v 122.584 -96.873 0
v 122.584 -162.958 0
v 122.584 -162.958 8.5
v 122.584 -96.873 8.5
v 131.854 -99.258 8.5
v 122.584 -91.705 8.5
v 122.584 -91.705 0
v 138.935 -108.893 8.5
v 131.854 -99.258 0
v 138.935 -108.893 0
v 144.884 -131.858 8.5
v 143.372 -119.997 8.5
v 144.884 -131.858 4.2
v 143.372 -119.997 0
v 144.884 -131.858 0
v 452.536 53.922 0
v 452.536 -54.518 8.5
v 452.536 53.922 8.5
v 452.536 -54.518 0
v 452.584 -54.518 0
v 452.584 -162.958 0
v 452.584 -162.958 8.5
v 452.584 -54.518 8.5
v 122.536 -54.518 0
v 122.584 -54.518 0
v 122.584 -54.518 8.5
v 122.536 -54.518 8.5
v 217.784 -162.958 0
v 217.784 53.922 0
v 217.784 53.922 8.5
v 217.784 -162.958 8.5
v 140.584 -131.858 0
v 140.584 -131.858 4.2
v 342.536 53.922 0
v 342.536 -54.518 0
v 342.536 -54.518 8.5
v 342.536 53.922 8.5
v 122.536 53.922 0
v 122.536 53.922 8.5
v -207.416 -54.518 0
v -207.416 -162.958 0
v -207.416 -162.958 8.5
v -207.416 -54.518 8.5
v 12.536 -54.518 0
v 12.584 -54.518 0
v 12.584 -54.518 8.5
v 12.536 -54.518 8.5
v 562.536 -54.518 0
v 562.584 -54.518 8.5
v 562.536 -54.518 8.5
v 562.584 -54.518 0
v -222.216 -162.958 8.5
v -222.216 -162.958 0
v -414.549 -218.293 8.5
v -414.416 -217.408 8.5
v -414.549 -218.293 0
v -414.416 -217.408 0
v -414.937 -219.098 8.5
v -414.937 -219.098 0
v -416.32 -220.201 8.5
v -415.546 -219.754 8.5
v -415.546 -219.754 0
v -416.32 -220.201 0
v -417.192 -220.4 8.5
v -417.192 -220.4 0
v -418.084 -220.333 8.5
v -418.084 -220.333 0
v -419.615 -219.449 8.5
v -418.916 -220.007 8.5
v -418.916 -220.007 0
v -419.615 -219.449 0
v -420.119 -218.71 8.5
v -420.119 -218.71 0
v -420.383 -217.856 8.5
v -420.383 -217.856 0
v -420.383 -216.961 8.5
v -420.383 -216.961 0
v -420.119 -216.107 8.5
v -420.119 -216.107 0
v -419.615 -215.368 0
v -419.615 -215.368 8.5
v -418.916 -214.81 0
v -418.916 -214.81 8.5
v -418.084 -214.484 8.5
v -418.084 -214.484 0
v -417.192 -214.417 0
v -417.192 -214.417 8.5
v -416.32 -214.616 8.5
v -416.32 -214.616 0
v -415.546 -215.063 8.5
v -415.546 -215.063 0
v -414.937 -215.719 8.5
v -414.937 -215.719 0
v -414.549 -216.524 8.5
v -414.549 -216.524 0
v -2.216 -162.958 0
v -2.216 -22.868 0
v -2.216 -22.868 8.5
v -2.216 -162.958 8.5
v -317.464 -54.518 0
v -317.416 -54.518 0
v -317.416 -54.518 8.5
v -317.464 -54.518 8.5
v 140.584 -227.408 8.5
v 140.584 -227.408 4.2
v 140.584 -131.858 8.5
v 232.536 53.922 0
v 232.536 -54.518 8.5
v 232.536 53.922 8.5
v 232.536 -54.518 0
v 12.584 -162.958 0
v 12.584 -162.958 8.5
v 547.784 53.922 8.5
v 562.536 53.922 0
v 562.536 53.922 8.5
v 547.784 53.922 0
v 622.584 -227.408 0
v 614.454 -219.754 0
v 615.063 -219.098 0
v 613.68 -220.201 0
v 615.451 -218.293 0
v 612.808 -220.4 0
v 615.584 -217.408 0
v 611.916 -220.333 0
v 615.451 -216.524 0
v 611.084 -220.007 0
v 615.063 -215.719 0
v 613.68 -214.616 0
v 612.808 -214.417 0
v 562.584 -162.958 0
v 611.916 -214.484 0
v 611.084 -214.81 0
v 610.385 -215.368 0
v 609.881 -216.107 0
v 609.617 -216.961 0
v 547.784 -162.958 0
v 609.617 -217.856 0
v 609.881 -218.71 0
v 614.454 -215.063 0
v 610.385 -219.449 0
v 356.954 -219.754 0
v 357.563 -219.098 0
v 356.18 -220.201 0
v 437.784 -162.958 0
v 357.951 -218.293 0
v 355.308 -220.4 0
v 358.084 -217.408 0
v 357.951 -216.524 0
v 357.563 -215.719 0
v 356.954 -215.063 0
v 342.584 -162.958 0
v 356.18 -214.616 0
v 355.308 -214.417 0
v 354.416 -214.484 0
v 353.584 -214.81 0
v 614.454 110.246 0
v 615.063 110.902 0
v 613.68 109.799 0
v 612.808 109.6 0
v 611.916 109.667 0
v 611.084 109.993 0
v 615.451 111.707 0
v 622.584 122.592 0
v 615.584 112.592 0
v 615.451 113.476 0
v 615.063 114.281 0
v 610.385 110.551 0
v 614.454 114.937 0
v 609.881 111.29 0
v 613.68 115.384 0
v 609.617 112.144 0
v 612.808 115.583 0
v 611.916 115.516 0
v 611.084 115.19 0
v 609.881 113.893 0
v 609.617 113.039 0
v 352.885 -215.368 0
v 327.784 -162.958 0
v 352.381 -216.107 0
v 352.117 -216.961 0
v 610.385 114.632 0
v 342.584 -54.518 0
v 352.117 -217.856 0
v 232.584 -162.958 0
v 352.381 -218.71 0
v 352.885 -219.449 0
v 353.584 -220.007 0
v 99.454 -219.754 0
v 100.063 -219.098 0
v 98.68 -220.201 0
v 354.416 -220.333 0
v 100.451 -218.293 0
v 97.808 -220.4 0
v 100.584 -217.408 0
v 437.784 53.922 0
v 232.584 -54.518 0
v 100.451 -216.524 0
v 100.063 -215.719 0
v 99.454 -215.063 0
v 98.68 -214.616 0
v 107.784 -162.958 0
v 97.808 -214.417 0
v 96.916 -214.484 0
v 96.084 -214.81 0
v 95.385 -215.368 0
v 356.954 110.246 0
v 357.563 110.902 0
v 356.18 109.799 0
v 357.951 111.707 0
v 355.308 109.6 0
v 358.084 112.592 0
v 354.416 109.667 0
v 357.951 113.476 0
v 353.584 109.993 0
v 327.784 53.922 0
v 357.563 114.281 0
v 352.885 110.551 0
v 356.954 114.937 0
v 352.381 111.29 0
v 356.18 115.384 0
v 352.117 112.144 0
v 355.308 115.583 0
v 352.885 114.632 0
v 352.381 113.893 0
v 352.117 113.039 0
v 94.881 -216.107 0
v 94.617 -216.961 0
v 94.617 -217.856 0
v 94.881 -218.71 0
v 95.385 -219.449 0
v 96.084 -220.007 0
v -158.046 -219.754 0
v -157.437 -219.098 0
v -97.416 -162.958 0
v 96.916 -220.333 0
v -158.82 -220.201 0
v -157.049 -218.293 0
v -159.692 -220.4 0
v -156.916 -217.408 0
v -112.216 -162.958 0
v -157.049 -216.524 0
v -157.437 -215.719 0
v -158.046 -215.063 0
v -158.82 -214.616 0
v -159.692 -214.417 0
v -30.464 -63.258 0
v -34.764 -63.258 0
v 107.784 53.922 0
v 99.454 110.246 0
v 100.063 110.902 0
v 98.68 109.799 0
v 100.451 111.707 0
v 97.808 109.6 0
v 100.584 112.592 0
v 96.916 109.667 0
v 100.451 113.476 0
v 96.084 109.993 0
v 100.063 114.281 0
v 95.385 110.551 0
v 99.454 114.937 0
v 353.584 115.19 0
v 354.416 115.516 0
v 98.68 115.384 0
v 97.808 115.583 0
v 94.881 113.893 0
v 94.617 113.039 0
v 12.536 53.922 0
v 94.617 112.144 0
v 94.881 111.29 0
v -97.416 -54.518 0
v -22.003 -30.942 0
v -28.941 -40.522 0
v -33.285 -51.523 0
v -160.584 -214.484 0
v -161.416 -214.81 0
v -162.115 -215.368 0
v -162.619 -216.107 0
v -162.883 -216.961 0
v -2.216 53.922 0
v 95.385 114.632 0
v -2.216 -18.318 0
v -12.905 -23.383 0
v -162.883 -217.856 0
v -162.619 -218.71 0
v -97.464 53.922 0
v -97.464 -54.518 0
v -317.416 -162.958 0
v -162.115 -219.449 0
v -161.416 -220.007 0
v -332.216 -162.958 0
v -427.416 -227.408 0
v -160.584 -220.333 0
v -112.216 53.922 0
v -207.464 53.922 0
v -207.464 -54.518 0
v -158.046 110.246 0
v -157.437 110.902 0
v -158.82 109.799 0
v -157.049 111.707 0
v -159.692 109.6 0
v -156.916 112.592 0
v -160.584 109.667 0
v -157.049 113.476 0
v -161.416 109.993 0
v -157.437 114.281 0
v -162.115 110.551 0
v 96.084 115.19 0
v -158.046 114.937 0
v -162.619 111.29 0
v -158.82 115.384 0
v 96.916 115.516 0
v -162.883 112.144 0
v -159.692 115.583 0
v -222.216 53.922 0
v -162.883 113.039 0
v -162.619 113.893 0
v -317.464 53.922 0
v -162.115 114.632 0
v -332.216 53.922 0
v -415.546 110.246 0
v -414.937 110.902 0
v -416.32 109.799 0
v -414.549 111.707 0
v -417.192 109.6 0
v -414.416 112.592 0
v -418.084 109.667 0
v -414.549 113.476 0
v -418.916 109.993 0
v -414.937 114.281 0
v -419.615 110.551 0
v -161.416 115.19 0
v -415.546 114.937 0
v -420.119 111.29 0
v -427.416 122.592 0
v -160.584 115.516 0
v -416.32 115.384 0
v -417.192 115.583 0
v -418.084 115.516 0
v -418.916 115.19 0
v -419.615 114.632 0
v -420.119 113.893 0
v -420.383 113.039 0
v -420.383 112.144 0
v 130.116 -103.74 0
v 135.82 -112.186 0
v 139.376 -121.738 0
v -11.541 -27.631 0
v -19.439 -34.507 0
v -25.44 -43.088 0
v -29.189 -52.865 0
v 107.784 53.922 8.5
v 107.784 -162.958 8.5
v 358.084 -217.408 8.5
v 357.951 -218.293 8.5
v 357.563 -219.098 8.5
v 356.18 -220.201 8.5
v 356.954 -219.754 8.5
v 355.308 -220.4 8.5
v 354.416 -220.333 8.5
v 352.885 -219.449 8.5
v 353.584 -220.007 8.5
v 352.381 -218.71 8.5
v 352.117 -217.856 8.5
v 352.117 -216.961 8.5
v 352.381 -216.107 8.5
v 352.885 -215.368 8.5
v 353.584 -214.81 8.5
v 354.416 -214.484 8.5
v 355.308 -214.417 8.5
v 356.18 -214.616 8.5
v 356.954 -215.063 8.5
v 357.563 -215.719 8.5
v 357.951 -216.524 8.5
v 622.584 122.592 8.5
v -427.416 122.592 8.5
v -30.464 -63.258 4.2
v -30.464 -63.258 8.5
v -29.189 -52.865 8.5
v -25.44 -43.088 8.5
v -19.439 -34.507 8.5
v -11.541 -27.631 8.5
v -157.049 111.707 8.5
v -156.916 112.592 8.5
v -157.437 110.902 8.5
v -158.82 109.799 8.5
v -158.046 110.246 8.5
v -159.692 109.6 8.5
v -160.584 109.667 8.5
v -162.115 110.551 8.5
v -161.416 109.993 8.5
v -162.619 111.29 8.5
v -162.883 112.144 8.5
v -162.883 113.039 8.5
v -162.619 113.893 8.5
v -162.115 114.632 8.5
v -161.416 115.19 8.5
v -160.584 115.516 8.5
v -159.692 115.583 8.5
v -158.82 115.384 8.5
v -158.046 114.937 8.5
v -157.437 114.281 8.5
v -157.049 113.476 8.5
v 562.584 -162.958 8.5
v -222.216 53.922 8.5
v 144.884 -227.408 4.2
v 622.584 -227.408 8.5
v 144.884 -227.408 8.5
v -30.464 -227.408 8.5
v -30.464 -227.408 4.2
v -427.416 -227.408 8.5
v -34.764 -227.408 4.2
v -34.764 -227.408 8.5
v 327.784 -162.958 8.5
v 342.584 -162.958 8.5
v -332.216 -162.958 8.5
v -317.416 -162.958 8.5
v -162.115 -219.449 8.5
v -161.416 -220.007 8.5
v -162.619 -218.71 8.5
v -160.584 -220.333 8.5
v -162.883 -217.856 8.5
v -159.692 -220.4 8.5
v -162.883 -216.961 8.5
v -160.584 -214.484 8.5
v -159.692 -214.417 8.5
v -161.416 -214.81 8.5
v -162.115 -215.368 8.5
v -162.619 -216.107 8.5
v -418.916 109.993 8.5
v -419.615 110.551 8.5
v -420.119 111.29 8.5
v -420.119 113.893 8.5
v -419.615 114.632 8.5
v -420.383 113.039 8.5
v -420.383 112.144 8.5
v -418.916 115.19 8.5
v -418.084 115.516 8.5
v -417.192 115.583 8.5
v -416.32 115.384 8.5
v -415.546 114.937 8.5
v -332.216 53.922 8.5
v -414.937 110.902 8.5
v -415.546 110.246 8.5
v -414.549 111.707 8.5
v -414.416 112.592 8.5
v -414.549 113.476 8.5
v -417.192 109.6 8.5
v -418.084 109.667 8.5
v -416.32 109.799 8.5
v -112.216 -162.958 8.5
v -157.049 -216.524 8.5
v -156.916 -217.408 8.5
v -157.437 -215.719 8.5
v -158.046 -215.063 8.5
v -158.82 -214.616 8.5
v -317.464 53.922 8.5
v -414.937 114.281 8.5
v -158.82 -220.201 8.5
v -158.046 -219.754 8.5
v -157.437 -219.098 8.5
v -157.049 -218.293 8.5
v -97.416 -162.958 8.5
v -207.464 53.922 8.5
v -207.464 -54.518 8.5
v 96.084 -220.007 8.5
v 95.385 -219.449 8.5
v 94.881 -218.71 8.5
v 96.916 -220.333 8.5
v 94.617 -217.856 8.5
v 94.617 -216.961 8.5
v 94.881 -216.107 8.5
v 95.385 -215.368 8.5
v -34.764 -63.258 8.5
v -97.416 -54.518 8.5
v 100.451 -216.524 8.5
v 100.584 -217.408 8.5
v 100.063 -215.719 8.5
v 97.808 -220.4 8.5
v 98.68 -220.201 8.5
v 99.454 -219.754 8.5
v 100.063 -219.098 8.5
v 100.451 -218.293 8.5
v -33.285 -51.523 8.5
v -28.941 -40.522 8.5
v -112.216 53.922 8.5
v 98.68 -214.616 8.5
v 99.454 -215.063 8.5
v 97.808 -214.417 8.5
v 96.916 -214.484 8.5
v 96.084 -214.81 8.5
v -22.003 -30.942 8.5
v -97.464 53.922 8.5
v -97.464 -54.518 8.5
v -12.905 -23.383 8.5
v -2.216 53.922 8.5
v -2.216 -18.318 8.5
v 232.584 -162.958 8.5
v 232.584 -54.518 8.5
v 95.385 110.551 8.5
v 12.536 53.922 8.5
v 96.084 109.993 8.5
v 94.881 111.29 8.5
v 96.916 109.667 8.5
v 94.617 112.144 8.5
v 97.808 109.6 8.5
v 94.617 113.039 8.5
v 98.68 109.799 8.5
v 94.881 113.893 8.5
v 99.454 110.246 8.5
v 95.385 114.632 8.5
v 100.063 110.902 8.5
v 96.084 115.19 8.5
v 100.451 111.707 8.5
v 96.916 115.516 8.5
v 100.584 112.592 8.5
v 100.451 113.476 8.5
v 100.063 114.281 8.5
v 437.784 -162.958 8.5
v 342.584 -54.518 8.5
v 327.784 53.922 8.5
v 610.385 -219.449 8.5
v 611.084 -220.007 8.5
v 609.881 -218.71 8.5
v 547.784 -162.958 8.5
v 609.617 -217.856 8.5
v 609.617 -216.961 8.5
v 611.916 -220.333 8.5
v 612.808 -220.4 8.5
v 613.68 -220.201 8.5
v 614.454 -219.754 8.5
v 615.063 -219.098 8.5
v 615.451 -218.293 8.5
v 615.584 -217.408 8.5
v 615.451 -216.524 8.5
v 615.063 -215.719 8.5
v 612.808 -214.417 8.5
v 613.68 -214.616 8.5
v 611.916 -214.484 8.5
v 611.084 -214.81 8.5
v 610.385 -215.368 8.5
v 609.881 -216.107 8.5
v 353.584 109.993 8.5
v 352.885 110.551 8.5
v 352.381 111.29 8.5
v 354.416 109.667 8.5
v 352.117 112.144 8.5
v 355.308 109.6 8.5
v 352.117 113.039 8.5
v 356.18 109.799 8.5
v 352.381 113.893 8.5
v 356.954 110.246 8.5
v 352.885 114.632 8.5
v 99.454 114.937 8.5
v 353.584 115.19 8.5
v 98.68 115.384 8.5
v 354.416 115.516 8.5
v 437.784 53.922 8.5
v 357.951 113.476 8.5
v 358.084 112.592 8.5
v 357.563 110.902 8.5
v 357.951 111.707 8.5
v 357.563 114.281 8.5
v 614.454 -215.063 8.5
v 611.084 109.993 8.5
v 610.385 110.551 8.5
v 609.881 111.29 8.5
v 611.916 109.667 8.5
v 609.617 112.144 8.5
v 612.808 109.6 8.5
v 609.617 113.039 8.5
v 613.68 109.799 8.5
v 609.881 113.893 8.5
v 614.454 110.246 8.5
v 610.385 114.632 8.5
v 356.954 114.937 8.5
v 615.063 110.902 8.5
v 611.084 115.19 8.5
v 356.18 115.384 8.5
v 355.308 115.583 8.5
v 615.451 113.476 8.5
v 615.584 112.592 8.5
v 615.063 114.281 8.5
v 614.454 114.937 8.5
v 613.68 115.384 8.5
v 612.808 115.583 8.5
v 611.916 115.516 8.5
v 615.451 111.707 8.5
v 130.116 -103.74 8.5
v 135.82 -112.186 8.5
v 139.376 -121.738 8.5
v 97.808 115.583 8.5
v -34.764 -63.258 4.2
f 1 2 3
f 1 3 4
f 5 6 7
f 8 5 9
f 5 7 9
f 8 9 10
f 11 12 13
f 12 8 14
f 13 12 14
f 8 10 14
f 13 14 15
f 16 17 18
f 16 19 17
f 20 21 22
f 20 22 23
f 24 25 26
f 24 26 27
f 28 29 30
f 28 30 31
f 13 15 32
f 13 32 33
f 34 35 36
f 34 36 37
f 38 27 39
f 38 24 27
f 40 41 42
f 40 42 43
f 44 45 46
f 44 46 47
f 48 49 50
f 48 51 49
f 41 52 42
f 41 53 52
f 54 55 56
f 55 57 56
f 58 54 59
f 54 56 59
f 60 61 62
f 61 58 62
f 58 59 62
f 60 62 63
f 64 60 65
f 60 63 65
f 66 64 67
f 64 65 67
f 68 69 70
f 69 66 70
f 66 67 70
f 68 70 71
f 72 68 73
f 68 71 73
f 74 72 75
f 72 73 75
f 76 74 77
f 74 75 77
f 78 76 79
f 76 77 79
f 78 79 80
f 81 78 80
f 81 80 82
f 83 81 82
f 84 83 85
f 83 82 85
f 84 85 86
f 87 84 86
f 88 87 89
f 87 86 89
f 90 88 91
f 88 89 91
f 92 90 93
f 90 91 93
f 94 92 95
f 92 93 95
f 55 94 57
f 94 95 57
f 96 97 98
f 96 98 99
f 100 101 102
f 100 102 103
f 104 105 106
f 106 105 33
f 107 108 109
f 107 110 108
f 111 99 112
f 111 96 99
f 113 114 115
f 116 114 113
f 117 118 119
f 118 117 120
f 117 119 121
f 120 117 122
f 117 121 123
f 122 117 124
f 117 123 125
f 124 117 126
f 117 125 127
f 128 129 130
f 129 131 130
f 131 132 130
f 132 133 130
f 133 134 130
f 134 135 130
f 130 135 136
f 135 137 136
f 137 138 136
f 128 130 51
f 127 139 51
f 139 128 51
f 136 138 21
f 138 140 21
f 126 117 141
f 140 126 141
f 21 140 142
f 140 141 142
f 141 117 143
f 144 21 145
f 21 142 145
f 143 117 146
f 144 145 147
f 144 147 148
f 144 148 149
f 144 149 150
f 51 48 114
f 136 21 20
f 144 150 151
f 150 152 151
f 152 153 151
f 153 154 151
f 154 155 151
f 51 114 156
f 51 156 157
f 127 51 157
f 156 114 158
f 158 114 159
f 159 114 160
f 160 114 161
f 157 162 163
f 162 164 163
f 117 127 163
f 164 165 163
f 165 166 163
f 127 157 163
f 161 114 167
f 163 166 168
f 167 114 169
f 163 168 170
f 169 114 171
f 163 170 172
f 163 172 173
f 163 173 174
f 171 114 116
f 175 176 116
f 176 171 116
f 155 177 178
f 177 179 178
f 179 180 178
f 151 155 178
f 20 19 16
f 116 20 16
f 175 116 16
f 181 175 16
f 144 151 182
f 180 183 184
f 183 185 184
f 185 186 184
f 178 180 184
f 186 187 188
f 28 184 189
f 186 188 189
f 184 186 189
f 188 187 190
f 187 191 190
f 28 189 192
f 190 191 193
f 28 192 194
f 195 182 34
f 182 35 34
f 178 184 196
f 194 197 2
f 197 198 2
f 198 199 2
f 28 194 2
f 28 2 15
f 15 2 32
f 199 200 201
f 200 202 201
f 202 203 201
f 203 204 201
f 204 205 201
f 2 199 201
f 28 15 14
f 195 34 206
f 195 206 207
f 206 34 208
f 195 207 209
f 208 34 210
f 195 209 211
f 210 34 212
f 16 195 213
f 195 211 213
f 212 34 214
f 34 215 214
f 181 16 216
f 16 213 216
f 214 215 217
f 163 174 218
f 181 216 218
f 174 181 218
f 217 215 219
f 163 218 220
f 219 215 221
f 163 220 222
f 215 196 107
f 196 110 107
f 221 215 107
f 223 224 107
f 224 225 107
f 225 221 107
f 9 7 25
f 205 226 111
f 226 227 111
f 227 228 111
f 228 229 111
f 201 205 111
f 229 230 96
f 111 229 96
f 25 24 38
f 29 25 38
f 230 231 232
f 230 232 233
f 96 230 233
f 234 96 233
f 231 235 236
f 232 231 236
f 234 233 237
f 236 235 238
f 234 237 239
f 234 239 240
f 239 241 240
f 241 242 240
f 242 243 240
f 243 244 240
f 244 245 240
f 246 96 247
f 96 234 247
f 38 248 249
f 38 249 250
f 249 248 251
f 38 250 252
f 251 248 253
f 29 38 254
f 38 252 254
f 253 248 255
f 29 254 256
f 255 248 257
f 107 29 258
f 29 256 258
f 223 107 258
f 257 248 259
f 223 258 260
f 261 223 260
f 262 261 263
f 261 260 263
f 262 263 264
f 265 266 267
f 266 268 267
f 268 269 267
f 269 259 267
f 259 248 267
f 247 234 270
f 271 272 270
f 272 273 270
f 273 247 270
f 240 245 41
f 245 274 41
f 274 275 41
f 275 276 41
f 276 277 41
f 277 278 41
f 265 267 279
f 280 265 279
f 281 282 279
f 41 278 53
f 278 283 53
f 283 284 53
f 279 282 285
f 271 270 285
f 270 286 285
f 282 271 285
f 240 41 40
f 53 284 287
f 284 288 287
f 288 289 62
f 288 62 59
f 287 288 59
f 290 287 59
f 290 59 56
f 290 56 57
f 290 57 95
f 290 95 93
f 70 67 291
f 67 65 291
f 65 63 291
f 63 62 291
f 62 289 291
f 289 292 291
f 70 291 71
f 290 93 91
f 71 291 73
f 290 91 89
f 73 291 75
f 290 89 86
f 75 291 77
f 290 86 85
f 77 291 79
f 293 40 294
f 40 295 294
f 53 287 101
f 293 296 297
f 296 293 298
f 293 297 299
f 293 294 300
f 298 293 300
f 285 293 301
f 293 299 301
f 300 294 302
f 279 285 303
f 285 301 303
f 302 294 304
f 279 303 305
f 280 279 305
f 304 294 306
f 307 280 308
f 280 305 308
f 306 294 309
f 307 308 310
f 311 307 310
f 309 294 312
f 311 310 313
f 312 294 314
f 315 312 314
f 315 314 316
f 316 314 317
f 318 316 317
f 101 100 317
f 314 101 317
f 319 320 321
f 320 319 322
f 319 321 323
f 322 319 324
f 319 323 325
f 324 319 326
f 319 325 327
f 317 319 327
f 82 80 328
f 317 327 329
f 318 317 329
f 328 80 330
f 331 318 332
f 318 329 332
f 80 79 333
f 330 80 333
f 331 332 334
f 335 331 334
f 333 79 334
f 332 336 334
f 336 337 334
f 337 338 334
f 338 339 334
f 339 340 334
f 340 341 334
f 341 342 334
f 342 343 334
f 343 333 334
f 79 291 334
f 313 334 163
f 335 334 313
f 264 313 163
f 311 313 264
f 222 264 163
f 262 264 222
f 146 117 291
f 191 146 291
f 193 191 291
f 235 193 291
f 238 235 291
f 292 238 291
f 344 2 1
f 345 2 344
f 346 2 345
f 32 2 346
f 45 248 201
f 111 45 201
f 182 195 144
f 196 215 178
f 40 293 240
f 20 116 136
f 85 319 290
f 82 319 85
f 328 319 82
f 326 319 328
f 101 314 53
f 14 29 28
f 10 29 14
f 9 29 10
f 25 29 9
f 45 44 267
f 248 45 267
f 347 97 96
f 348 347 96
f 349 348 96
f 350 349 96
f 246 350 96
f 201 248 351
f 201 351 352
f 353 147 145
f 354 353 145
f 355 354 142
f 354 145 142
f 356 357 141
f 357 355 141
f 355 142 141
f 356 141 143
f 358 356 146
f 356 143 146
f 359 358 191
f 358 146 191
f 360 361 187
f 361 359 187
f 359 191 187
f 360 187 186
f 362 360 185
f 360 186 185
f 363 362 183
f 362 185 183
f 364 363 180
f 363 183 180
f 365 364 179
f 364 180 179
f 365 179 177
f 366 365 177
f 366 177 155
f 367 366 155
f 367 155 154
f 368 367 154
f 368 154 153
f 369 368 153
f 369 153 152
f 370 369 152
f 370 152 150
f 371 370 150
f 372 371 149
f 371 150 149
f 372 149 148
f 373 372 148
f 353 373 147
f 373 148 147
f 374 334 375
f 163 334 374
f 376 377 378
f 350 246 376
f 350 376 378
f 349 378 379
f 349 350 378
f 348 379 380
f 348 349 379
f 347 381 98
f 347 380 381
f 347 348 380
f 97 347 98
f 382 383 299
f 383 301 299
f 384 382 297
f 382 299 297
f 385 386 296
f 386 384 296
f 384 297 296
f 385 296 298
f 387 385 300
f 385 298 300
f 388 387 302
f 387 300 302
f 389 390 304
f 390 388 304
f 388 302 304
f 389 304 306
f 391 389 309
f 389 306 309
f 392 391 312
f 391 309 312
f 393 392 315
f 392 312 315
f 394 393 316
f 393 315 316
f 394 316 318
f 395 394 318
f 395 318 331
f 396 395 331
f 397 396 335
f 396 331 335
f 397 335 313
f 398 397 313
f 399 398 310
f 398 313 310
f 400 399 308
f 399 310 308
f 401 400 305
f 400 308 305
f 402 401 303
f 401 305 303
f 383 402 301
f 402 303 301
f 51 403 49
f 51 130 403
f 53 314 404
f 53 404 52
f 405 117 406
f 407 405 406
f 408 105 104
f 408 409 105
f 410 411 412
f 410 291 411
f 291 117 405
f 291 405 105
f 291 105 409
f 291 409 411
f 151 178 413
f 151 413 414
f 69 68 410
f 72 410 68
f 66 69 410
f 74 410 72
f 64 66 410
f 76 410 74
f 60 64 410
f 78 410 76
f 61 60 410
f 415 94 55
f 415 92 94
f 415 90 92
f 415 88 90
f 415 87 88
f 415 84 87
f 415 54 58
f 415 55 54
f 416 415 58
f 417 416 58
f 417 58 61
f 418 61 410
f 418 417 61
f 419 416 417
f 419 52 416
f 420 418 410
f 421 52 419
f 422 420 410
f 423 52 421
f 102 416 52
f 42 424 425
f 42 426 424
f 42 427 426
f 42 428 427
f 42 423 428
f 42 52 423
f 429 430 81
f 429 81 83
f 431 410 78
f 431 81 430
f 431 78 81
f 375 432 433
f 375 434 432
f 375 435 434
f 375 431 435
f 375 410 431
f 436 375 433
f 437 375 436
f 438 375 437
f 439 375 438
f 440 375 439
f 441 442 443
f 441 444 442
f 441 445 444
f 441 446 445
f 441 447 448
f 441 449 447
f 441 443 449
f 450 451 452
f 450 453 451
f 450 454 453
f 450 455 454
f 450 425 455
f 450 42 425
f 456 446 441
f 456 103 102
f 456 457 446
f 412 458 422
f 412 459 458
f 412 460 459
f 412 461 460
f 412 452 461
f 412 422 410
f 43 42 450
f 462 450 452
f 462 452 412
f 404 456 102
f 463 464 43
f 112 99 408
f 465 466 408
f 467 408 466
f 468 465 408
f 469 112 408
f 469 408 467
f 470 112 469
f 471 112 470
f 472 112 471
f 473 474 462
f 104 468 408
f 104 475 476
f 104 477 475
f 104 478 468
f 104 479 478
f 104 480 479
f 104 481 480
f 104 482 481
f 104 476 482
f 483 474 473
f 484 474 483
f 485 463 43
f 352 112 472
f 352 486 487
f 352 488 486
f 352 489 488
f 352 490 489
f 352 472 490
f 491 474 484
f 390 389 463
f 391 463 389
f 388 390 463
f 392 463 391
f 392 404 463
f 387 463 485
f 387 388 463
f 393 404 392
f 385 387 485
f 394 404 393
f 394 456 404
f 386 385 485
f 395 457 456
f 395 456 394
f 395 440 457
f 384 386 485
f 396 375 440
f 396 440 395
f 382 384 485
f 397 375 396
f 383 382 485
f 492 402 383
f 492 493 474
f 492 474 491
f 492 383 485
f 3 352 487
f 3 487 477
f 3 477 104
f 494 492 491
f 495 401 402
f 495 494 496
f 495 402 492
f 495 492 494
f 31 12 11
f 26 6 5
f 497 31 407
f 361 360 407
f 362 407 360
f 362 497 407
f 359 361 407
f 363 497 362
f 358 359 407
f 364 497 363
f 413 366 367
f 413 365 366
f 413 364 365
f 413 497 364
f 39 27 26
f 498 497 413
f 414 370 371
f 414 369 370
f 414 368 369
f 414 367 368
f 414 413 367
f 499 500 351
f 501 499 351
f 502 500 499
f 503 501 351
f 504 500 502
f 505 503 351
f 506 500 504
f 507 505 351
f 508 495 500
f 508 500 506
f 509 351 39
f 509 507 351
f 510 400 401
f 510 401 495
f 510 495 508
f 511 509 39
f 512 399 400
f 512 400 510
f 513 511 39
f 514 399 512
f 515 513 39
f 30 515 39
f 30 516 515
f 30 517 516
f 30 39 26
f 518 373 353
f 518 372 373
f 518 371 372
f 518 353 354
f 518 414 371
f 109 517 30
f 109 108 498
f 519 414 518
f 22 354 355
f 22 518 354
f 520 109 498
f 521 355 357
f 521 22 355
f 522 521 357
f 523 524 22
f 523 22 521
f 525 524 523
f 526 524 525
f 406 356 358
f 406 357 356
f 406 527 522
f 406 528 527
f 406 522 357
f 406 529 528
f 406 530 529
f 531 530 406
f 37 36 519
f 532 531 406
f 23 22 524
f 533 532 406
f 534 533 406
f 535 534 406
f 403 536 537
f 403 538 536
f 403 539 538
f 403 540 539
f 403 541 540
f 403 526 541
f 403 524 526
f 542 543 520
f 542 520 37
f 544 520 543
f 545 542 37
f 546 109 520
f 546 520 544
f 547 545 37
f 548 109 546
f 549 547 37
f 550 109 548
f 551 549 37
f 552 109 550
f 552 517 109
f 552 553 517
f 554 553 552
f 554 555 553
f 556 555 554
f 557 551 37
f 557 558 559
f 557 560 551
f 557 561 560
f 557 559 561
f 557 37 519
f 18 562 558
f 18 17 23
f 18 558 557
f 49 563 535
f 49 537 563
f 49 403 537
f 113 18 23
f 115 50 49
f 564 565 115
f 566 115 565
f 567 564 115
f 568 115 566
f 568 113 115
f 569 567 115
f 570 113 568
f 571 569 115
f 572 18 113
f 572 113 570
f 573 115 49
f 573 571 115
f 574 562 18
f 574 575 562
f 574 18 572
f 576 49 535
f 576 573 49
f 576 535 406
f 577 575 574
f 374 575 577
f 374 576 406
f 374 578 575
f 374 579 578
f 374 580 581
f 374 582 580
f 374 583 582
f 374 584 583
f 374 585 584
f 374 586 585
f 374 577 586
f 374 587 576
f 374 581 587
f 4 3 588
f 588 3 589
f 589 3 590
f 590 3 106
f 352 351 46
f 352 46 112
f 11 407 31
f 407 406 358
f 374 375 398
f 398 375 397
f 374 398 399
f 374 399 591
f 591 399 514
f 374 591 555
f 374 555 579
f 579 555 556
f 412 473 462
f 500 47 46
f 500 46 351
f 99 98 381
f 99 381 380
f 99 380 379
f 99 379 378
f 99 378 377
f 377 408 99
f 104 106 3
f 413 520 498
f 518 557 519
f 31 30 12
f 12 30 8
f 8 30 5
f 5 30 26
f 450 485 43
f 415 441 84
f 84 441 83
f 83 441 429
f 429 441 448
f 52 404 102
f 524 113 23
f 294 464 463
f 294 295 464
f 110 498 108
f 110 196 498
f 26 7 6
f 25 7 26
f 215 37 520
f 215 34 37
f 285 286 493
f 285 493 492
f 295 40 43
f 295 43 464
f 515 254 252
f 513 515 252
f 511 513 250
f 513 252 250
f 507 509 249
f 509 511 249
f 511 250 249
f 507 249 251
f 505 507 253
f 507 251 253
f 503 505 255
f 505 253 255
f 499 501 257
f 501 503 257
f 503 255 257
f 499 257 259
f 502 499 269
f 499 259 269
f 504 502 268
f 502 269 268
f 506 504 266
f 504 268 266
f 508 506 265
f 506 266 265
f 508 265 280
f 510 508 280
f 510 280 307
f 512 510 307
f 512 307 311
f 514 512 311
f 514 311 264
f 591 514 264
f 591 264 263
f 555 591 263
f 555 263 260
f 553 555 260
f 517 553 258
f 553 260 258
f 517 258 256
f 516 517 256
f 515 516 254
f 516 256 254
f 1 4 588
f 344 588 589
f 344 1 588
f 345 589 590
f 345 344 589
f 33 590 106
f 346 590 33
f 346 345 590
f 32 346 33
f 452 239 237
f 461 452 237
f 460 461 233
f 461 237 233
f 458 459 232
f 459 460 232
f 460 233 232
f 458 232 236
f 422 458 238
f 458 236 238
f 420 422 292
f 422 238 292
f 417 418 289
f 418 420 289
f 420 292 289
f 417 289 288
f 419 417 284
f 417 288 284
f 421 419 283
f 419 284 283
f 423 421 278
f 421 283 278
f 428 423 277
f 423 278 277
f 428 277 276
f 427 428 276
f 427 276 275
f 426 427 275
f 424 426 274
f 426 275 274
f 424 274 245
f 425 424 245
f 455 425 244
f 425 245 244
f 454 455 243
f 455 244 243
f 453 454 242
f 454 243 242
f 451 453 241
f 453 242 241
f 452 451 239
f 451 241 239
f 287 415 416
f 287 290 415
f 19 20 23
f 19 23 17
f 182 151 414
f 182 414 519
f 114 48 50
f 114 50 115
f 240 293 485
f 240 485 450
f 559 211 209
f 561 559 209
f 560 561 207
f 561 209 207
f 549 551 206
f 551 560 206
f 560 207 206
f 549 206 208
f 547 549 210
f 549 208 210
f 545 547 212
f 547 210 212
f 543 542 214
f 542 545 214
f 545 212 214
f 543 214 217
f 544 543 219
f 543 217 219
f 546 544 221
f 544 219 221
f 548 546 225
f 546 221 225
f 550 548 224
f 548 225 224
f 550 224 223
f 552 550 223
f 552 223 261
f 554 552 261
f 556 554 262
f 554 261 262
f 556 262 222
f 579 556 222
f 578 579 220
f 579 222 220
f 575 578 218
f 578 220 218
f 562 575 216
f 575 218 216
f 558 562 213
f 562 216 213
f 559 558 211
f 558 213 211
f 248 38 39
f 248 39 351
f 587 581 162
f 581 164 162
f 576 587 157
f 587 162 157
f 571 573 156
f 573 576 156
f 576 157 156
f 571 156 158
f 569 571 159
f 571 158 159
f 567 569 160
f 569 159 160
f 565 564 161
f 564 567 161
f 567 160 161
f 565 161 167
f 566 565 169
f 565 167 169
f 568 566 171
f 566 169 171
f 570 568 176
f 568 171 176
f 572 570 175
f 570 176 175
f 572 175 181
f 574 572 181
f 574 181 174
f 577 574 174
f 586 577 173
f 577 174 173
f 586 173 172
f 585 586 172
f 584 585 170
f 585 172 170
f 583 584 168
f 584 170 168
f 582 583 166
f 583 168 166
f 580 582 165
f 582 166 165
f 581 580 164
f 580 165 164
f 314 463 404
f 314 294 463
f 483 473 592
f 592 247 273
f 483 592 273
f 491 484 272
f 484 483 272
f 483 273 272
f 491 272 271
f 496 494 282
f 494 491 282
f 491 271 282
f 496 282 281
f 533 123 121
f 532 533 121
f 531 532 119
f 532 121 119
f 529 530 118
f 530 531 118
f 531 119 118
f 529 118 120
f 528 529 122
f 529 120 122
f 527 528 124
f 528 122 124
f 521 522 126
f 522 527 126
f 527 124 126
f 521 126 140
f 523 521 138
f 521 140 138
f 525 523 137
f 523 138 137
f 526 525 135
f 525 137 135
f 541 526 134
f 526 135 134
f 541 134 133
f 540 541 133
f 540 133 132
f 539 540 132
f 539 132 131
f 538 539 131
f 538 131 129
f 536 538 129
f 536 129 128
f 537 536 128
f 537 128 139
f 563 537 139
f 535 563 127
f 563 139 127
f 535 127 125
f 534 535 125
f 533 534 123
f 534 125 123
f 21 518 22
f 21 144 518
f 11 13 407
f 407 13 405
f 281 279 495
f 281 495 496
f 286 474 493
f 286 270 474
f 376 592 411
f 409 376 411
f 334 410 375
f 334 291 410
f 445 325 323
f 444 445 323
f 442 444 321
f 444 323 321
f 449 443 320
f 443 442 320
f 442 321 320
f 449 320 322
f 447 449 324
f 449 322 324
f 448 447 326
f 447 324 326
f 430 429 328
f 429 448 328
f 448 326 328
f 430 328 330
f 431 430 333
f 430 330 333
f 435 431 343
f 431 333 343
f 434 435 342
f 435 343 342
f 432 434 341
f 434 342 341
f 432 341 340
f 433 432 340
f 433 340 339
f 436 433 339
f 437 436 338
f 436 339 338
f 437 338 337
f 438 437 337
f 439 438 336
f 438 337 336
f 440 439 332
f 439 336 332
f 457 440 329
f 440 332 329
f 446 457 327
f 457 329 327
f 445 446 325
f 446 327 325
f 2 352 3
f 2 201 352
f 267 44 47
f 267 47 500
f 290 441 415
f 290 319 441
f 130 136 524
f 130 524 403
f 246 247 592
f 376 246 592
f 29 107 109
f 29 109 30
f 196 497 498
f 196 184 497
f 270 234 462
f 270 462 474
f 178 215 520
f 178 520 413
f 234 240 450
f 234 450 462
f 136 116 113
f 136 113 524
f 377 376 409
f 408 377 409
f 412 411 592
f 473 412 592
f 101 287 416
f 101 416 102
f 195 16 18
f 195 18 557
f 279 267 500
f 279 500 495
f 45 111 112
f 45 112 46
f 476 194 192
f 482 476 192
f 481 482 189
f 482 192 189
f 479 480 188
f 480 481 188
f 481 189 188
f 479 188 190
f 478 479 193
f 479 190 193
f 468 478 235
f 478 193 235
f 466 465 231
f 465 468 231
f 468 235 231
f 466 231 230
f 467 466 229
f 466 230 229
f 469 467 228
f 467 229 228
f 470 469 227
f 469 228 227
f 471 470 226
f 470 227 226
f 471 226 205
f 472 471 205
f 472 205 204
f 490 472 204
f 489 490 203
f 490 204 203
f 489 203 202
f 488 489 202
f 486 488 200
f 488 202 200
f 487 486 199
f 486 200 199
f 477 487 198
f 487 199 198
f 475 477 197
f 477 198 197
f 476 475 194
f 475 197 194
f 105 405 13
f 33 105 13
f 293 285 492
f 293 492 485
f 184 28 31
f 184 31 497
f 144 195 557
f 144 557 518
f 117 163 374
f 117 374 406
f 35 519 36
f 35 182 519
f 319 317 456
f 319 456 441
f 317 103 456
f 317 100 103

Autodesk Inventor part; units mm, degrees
ref_plane "YZ Plane" through (0, 0, 0) normal (1, 0, 0) x (0, 1, 0)
ref_plane "XZ Plane" through (0, 0, 0) normal (0, 1, 0) x (-1, 0, 0)
ref_plane "XY Plane" through (0, 0, 0) normal (0, 0, 1) x (1, 0, 0)
sketch "Sketch1" plane through (0, 0, 0) normal (0, 0, 1) x (1, 0, 0)
  line L0 (97.5839, -20.2585) -> (97.5839, -84.5585) construction
  line L1 (97.5839, -52.4085) -> (19.6066, -52.4085)
  line L2 (622.5839, -227.4085) -> (-427.4161, -227.4085)
  line L3 (-427.4161, -227.4085) -> (-427.4161, 122.5915)
  line L4 (-427.4161, 122.5915) -> (622.5839, 122.5915)
  line L5 (622.5839, 122.5915) -> (622.5839, -227.4085)
  line L6 (622.5839, -227.4085) -> (-427.4161, 122.5915) construction
  line L7 (-427.4161, -227.4085) -> (622.5839, 122.5915) construction
  line L8 (122.536, -54.5185) -> (122.536, 53.9215) projected
  line L9 (122.536, 53.9215) -> (107.7839, 53.9215) projected
  line L10 (107.7839, 53.9215) -> (107.7839, -54.5185) projected
  line L11 (107.7839, -54.5185) -> (122.536, -54.5185) projected
  line L12 (122.5839, -162.9585) -> (122.5839, -54.5185) projected
  line L13 (122.5839, -54.5185) -> (107.7839, -54.5185) projected
  line L14 (107.7839, -54.5185) -> (107.7839, -162.9585) projected
  line L15 (107.7839, -162.9585) -> (122.5839, -162.9585) projected
  line L16 (12.536, -54.5185) -> (12.536, 53.9215) projected
  line L17 (12.536, 53.9215) -> (-2.2161, 53.9215) projected
  line L18 (-2.2161, 53.9215) -> (-2.2161, -54.5185) projected
  line L19 (-2.2161, -54.5185) -> (12.536, -54.5185) projected
  line L20 (12.5839, -162.9585) -> (12.5839, -54.5185) projected
  line L21 (12.5839, -54.5185) -> (-2.2161, -54.5185) projected
  line L22 (-2.2161, -54.5185) -> (-2.2161, -162.9585) projected
  line L23 (-2.2161, -162.9585) -> (12.5839, -162.9585) projected
  line L24 (-97.4161, -162.9585) -> (-97.4161, -54.5185) projected
  line L25 (-97.4161, -54.5185) -> (-112.2161, -54.5185) projected
  line L26 (-112.2161, -54.5185) -> (-112.2161, -162.9585) projected
  line L27 (-112.2161, -162.9585) -> (-97.4161, -162.9585) projected
  line L28 (-97.464, -54.5185) -> (-97.464, 53.9215) projected
  line L29 (-97.464, 53.9215) -> (-112.2161, 53.9215) projected
  line L30 (-112.2161, 53.9215) -> (-112.2161, -54.5185) projected
  line L31 (-112.2161, -54.5185) -> (-97.464, -54.5185) projected
  line L32 (-317.464, -54.5185) -> (-317.464, 53.9215) projected
  line L33 (-317.464, 53.9215) -> (-332.2161, 53.9215) projected
  line L34 (-332.2161, 53.9215) -> (-332.2161, -54.5185) projected
  line L35 (-332.2161, -54.5185) -> (-317.464, -54.5185) projected
  line L36 (-317.4161, -162.9585) -> (-317.4161, -54.5185) projected
  line L37 (-317.4161, -54.5185) -> (-332.2161, -54.5185) projected
  line L38 (-332.2161, -54.5185) -> (-332.2161, -162.9585) projected
  line L39 (-332.2161, -162.9585) -> (-317.4161, -162.9585) projected
  line L40 (-207.4161, -162.9585) -> (-207.4161, -54.5185) projected
  line L41 (-207.4161, -54.5185) -> (-222.2161, -54.5185) projected
  line L42 (-222.2161, -54.5185) -> (-222.2161, -162.9585) projected
  line L43 (-222.2161, -162.9585) -> (-207.4161, -162.9585) projected
  line L44 (-207.464, -54.5185) -> (-207.464, 53.9215) projected
  line L45 (-207.464, 53.9215) -> (-222.2161, 53.9215) projected
  line L46 (-222.2161, 53.9215) -> (-222.2161, -54.5185) projected
  line L47 (-222.2161, -54.5185) -> (-207.464, -54.5185) projected
  line L48 (562.536, -54.5185) -> (562.536, 53.9215) projected
  line L49 (562.536, 53.9215) -> (547.7839, 53.9215) projected
  line L50 (547.7839, 53.9215) -> (547.7839, -54.5185) projected
  line L51 (547.7839, -54.5185) -> (562.536, -54.5185) projected
  line L52 (562.5839, -162.9585) -> (562.5839, -54.5185) projected
  line L53 (562.5839, -54.5185) -> (547.7839, -54.5185) projected
  line L54 (547.7839, -54.5185) -> (547.7839, -162.9585) projected
  line L55 (547.7839, -162.9585) -> (562.5839, -162.9585) projected
  line L56 (452.5839, -162.9585) -> (452.5839, -54.5185) projected
  line L57 (452.5839, -54.5185) -> (437.7839, -54.5185) projected
  line L58 (437.7839, -54.5185) -> (437.7839, -162.9585) projected
  line L59 (437.7839, -162.9585) -> (452.5839, -162.9585) projected
  line L60 (452.536, -54.5185) -> (452.536, 53.9215) projected
  line L61 (452.536, 53.9215) -> (437.7839, 53.9215) projected
  line L62 (437.7839, 53.9215) -> (437.7839, -54.5185) projected
  line L63 (437.7839, -54.5185) -> (452.536, -54.5185) projected
  line L64 (342.536, -54.5185) -> (342.536, 53.9215) projected
  line L65 (342.536, 53.9215) -> (327.7839, 53.9215) projected
  line L66 (327.7839, 53.9215) -> (327.7839, -54.5185) projected
  line L67 (327.7839, -54.5185) -> (342.536, -54.5185) projected
  line L68 (342.5839, -162.9585) -> (342.5839, -54.5185) projected
  line L69 (342.5839, -54.5185) -> (327.7839, -54.5185) projected
  line L70 (327.7839, -54.5185) -> (327.7839, -162.9585) projected
  line L71 (327.7839, -162.9585) -> (342.5839, -162.9585) projected
  line L72 (232.536, -54.5185) -> (232.536, 53.9215) projected
  line L73 (232.536, 53.9215) -> (217.7839, 53.9215) projected
  line L74 (217.7839, 53.9215) -> (217.7839, -54.5185) projected
  line L75 (217.7839, -54.5185) -> (232.536, -54.5185) projected
  line L76 (232.5839, -162.9585) -> (232.5839, -54.5185) projected
  line L77 (232.5839, -54.5185) -> (217.7839, -54.5185) projected
  line L78 (217.7839, -54.5185) -> (217.7839, -162.9585) projected
  line L79 (217.7839, -162.9585) -> (232.5839, -162.9585) projected
  line L80 (144.8839, -131.8585) -> (144.8839, -227.4085) projected
  line L81 (140.5839, -227.4085) -> (140.5839, -131.8585) projected
  arc A0 (144.8839, -131.8585) -> (97.5839, -84.5585) centre (97.5839, -131.8585) ccw projected
  arc A1 (140.5839, -131.8585) -> (97.5839, -88.8585) centre (97.5839, -131.8585) ccw projected
  line L82 (-34.764, -227.4085) -> (-34.764, -63.2585) projected
  line L83 (-30.464, -63.2585) -> (-30.464, -227.4085) projected
  arc A2 (12.536, -20.2585) -> (-30.464, -63.2585) centre (12.536, -63.2585) ccw projected
  arc A3 (12.536, -15.9585) -> (-34.764, -63.2585) centre (12.536, -63.2585) ccw projected
  circle A4 centre (-417.4161, 112.5915) radius 3 projected
  line L84 (622.5839, 122.5915) -> (-427.4161, 122.5915) projected
  line L85 (622.5839, -227.4085) -> (622.5839, 122.5915) projected
  line L86 (-427.4161, -227.4085) -> (622.5839, -227.4085) projected
  line L87 (-427.4161, 122.5915) -> (-427.4161, -227.4085) projected
  circle A5 centre (-417.4161, -217.4085) radius 3 projected
  line L88 (622.5839, 122.5915) -> (-427.4161, 122.5915) projected
  line L89 (622.5839, -227.4085) -> (622.5839, 122.5915) projected
  line L90 (-427.4161, -227.4085) -> (622.5839, -227.4085) projected
  line L91 (-427.4161, 122.5915) -> (-427.4161, -227.4085) projected
  line L92 (622.5839, 122.5915) -> (-427.4161, 122.5915) projected
  line L93 (622.5839, -227.4085) -> (622.5839, 122.5915) projected
  line L94 (-427.4161, -227.4085) -> (622.5839, -227.4085) projected
  line L95 (-427.4161, 122.5915) -> (-427.4161, -227.4085) projected
  circle A6 centre (612.5839, 112.5915) radius 3 projected
  circle A7 centre (612.5839, -217.4085) radius 3 projected
  circle A8 centre (-159.9161, -217.4085) radius 3 projected
  circle A9 centre (97.5839, -217.4085) radius 3 projected
  circle A10 centre (355.0839, -217.4085) radius 3 projected
  circle A11 centre (-159.9161, 112.5915) radius 3 projected
  circle A12 centre (97.5839, 112.5915) radius 3 projected
  circle A13 centre (355.0839, 112.5915) radius 3 projected
  circle A14 centre (97.5839, 112.5915) radius 3 projected
  circle A15 centre (612.5839, -217.4085) radius 3 projected
  circle A16 centre (355.0839, -217.4085) radius 3 projected
  circle A17 centre (97.5839, -217.4085) radius 3 projected
  circle A18 centre (-159.9161, -217.4085) radius 3 projected
  circle A19 centre (-417.4161, -217.4085) radius 3 projected
  circle A20 centre (355.0839, 112.5915) radius 3 projected
  circle A21 centre (-417.4161, 112.5915) radius 3 projected
  circle A22 centre (612.5839, 112.5915) radius 3 projected
  circle A23 centre (-159.9161, 112.5915) radius 3 projected
  circle A24 centre (97.5839, 112.5915) radius 3 projected
  circle A25 centre (612.5839, -217.4085) radius 3 projected
  circle A26 centre (355.0839, -217.4085) radius 3 projected
  circle A27 centre (97.5839, -217.4085) radius 3 projected
  circle A28 centre (-159.9161, -217.4085) radius 3 projected
  circle A29 centre (-417.4161, -217.4085) radius 3 projected
  circle A30 centre (355.0839, 112.5915) radius 3 projected
  circle A31 centre (-417.4161, 112.5915) radius 3 projected
  circle A32 centre (612.5839, 112.5915) radius 3 projected
  circle A33 centre (-159.9161, 112.5915) radius 3 projected
  circle A34 centre (97.5839, 112.5915) radius 3 projected
  circle A35 centre (612.5839, -217.4085) radius 3 projected
  circle A36 centre (355.0839, -217.4085) radius 3 projected
  circle A37 centre (97.5839, -217.4085) radius 3 projected
  circle A38 centre (-159.9161, -217.4085) radius 3 projected
  circle A39 centre (-417.4161, -217.4085) radius 3 projected
  circle A40 centre (355.0839, 112.5915) radius 3 projected
  circle A41 centre (-417.4161, 112.5915) radius 3 projected
  circle A42 centre (612.5839, 112.5915) radius 3 projected
  circle A43 centre (-159.9161, 112.5915) radius 3 projected
  point P0 (0, 0)
  point P1 (-2.2161, -18.3178)
  point P2 (-2.2161, -22.8682)
  point P3 (122.5839, -96.8728)
  point P4 (122.5839, -91.7052)
  dimension "d0" = 1050
  dimension "d1" = 350
extrude "Extrusion2" add sketch "Sketch1" along normal blind 8.5 contours L2 L80 A0 L12 L13 L8 L9 L10 L14 L15 A1 L81 L83 A2 L18 L22 L23 L20 L21 L16 L17 A3 L82 L3 L4 L5
sketch "Sketch2" plane through (144.8839, -227.4085, 0) normal (-1, 0, 0) x (0, 0, 1)
  line L0 (0, 95.55) -> (8.5, 95.55) projected
  line L1 (0, 95.55) -> (0, 0) projected
  line L2 (0, 0) -> (8.5, 0) projected
  line L3 (8.5, 95.55) -> (8.5, 0) projected
  line L4 (4.2, 0) -> (4.2, 95.55)
  point P0 (0, 227.4085)
  dimension "d6" = 4.3
  dimension "d7" = 4.3
extrude "Extrusion3" add sketch "Sketch2" along normal blind 4.3 contours L0 L4 L2 L1
sketch "Sketch3" plane through (-34.764, -227.4085, 0) normal (1, 0, 0) x (0, 0, -1)
  line L0 (0, 0) -> (0, 164.15) projected
  line L1 (0, 164.15) -> (-8.5, 164.15) projected
  line L2 (-8.5, 0) -> (-8.5, 164.15) projected
  line L3 (0, 0) -> (-8.5, 0) projected
  line L4 (0, 164.15) -> (-8.5, 164.15) projected
  line L5 (-4.2, 164.15) -> (-4.2, 0)
  point P0 (0, 227.4085)
  dimension "d10" = 4.3
  dimension "d11" = 4.3
extrude "Extrusion4" add sketch "Sketch3" along normal blind 4.3 contours L3 L5 L1 L0
properties part number "PrimaryCoilFerriteLayer" material "Iron, Cast"
